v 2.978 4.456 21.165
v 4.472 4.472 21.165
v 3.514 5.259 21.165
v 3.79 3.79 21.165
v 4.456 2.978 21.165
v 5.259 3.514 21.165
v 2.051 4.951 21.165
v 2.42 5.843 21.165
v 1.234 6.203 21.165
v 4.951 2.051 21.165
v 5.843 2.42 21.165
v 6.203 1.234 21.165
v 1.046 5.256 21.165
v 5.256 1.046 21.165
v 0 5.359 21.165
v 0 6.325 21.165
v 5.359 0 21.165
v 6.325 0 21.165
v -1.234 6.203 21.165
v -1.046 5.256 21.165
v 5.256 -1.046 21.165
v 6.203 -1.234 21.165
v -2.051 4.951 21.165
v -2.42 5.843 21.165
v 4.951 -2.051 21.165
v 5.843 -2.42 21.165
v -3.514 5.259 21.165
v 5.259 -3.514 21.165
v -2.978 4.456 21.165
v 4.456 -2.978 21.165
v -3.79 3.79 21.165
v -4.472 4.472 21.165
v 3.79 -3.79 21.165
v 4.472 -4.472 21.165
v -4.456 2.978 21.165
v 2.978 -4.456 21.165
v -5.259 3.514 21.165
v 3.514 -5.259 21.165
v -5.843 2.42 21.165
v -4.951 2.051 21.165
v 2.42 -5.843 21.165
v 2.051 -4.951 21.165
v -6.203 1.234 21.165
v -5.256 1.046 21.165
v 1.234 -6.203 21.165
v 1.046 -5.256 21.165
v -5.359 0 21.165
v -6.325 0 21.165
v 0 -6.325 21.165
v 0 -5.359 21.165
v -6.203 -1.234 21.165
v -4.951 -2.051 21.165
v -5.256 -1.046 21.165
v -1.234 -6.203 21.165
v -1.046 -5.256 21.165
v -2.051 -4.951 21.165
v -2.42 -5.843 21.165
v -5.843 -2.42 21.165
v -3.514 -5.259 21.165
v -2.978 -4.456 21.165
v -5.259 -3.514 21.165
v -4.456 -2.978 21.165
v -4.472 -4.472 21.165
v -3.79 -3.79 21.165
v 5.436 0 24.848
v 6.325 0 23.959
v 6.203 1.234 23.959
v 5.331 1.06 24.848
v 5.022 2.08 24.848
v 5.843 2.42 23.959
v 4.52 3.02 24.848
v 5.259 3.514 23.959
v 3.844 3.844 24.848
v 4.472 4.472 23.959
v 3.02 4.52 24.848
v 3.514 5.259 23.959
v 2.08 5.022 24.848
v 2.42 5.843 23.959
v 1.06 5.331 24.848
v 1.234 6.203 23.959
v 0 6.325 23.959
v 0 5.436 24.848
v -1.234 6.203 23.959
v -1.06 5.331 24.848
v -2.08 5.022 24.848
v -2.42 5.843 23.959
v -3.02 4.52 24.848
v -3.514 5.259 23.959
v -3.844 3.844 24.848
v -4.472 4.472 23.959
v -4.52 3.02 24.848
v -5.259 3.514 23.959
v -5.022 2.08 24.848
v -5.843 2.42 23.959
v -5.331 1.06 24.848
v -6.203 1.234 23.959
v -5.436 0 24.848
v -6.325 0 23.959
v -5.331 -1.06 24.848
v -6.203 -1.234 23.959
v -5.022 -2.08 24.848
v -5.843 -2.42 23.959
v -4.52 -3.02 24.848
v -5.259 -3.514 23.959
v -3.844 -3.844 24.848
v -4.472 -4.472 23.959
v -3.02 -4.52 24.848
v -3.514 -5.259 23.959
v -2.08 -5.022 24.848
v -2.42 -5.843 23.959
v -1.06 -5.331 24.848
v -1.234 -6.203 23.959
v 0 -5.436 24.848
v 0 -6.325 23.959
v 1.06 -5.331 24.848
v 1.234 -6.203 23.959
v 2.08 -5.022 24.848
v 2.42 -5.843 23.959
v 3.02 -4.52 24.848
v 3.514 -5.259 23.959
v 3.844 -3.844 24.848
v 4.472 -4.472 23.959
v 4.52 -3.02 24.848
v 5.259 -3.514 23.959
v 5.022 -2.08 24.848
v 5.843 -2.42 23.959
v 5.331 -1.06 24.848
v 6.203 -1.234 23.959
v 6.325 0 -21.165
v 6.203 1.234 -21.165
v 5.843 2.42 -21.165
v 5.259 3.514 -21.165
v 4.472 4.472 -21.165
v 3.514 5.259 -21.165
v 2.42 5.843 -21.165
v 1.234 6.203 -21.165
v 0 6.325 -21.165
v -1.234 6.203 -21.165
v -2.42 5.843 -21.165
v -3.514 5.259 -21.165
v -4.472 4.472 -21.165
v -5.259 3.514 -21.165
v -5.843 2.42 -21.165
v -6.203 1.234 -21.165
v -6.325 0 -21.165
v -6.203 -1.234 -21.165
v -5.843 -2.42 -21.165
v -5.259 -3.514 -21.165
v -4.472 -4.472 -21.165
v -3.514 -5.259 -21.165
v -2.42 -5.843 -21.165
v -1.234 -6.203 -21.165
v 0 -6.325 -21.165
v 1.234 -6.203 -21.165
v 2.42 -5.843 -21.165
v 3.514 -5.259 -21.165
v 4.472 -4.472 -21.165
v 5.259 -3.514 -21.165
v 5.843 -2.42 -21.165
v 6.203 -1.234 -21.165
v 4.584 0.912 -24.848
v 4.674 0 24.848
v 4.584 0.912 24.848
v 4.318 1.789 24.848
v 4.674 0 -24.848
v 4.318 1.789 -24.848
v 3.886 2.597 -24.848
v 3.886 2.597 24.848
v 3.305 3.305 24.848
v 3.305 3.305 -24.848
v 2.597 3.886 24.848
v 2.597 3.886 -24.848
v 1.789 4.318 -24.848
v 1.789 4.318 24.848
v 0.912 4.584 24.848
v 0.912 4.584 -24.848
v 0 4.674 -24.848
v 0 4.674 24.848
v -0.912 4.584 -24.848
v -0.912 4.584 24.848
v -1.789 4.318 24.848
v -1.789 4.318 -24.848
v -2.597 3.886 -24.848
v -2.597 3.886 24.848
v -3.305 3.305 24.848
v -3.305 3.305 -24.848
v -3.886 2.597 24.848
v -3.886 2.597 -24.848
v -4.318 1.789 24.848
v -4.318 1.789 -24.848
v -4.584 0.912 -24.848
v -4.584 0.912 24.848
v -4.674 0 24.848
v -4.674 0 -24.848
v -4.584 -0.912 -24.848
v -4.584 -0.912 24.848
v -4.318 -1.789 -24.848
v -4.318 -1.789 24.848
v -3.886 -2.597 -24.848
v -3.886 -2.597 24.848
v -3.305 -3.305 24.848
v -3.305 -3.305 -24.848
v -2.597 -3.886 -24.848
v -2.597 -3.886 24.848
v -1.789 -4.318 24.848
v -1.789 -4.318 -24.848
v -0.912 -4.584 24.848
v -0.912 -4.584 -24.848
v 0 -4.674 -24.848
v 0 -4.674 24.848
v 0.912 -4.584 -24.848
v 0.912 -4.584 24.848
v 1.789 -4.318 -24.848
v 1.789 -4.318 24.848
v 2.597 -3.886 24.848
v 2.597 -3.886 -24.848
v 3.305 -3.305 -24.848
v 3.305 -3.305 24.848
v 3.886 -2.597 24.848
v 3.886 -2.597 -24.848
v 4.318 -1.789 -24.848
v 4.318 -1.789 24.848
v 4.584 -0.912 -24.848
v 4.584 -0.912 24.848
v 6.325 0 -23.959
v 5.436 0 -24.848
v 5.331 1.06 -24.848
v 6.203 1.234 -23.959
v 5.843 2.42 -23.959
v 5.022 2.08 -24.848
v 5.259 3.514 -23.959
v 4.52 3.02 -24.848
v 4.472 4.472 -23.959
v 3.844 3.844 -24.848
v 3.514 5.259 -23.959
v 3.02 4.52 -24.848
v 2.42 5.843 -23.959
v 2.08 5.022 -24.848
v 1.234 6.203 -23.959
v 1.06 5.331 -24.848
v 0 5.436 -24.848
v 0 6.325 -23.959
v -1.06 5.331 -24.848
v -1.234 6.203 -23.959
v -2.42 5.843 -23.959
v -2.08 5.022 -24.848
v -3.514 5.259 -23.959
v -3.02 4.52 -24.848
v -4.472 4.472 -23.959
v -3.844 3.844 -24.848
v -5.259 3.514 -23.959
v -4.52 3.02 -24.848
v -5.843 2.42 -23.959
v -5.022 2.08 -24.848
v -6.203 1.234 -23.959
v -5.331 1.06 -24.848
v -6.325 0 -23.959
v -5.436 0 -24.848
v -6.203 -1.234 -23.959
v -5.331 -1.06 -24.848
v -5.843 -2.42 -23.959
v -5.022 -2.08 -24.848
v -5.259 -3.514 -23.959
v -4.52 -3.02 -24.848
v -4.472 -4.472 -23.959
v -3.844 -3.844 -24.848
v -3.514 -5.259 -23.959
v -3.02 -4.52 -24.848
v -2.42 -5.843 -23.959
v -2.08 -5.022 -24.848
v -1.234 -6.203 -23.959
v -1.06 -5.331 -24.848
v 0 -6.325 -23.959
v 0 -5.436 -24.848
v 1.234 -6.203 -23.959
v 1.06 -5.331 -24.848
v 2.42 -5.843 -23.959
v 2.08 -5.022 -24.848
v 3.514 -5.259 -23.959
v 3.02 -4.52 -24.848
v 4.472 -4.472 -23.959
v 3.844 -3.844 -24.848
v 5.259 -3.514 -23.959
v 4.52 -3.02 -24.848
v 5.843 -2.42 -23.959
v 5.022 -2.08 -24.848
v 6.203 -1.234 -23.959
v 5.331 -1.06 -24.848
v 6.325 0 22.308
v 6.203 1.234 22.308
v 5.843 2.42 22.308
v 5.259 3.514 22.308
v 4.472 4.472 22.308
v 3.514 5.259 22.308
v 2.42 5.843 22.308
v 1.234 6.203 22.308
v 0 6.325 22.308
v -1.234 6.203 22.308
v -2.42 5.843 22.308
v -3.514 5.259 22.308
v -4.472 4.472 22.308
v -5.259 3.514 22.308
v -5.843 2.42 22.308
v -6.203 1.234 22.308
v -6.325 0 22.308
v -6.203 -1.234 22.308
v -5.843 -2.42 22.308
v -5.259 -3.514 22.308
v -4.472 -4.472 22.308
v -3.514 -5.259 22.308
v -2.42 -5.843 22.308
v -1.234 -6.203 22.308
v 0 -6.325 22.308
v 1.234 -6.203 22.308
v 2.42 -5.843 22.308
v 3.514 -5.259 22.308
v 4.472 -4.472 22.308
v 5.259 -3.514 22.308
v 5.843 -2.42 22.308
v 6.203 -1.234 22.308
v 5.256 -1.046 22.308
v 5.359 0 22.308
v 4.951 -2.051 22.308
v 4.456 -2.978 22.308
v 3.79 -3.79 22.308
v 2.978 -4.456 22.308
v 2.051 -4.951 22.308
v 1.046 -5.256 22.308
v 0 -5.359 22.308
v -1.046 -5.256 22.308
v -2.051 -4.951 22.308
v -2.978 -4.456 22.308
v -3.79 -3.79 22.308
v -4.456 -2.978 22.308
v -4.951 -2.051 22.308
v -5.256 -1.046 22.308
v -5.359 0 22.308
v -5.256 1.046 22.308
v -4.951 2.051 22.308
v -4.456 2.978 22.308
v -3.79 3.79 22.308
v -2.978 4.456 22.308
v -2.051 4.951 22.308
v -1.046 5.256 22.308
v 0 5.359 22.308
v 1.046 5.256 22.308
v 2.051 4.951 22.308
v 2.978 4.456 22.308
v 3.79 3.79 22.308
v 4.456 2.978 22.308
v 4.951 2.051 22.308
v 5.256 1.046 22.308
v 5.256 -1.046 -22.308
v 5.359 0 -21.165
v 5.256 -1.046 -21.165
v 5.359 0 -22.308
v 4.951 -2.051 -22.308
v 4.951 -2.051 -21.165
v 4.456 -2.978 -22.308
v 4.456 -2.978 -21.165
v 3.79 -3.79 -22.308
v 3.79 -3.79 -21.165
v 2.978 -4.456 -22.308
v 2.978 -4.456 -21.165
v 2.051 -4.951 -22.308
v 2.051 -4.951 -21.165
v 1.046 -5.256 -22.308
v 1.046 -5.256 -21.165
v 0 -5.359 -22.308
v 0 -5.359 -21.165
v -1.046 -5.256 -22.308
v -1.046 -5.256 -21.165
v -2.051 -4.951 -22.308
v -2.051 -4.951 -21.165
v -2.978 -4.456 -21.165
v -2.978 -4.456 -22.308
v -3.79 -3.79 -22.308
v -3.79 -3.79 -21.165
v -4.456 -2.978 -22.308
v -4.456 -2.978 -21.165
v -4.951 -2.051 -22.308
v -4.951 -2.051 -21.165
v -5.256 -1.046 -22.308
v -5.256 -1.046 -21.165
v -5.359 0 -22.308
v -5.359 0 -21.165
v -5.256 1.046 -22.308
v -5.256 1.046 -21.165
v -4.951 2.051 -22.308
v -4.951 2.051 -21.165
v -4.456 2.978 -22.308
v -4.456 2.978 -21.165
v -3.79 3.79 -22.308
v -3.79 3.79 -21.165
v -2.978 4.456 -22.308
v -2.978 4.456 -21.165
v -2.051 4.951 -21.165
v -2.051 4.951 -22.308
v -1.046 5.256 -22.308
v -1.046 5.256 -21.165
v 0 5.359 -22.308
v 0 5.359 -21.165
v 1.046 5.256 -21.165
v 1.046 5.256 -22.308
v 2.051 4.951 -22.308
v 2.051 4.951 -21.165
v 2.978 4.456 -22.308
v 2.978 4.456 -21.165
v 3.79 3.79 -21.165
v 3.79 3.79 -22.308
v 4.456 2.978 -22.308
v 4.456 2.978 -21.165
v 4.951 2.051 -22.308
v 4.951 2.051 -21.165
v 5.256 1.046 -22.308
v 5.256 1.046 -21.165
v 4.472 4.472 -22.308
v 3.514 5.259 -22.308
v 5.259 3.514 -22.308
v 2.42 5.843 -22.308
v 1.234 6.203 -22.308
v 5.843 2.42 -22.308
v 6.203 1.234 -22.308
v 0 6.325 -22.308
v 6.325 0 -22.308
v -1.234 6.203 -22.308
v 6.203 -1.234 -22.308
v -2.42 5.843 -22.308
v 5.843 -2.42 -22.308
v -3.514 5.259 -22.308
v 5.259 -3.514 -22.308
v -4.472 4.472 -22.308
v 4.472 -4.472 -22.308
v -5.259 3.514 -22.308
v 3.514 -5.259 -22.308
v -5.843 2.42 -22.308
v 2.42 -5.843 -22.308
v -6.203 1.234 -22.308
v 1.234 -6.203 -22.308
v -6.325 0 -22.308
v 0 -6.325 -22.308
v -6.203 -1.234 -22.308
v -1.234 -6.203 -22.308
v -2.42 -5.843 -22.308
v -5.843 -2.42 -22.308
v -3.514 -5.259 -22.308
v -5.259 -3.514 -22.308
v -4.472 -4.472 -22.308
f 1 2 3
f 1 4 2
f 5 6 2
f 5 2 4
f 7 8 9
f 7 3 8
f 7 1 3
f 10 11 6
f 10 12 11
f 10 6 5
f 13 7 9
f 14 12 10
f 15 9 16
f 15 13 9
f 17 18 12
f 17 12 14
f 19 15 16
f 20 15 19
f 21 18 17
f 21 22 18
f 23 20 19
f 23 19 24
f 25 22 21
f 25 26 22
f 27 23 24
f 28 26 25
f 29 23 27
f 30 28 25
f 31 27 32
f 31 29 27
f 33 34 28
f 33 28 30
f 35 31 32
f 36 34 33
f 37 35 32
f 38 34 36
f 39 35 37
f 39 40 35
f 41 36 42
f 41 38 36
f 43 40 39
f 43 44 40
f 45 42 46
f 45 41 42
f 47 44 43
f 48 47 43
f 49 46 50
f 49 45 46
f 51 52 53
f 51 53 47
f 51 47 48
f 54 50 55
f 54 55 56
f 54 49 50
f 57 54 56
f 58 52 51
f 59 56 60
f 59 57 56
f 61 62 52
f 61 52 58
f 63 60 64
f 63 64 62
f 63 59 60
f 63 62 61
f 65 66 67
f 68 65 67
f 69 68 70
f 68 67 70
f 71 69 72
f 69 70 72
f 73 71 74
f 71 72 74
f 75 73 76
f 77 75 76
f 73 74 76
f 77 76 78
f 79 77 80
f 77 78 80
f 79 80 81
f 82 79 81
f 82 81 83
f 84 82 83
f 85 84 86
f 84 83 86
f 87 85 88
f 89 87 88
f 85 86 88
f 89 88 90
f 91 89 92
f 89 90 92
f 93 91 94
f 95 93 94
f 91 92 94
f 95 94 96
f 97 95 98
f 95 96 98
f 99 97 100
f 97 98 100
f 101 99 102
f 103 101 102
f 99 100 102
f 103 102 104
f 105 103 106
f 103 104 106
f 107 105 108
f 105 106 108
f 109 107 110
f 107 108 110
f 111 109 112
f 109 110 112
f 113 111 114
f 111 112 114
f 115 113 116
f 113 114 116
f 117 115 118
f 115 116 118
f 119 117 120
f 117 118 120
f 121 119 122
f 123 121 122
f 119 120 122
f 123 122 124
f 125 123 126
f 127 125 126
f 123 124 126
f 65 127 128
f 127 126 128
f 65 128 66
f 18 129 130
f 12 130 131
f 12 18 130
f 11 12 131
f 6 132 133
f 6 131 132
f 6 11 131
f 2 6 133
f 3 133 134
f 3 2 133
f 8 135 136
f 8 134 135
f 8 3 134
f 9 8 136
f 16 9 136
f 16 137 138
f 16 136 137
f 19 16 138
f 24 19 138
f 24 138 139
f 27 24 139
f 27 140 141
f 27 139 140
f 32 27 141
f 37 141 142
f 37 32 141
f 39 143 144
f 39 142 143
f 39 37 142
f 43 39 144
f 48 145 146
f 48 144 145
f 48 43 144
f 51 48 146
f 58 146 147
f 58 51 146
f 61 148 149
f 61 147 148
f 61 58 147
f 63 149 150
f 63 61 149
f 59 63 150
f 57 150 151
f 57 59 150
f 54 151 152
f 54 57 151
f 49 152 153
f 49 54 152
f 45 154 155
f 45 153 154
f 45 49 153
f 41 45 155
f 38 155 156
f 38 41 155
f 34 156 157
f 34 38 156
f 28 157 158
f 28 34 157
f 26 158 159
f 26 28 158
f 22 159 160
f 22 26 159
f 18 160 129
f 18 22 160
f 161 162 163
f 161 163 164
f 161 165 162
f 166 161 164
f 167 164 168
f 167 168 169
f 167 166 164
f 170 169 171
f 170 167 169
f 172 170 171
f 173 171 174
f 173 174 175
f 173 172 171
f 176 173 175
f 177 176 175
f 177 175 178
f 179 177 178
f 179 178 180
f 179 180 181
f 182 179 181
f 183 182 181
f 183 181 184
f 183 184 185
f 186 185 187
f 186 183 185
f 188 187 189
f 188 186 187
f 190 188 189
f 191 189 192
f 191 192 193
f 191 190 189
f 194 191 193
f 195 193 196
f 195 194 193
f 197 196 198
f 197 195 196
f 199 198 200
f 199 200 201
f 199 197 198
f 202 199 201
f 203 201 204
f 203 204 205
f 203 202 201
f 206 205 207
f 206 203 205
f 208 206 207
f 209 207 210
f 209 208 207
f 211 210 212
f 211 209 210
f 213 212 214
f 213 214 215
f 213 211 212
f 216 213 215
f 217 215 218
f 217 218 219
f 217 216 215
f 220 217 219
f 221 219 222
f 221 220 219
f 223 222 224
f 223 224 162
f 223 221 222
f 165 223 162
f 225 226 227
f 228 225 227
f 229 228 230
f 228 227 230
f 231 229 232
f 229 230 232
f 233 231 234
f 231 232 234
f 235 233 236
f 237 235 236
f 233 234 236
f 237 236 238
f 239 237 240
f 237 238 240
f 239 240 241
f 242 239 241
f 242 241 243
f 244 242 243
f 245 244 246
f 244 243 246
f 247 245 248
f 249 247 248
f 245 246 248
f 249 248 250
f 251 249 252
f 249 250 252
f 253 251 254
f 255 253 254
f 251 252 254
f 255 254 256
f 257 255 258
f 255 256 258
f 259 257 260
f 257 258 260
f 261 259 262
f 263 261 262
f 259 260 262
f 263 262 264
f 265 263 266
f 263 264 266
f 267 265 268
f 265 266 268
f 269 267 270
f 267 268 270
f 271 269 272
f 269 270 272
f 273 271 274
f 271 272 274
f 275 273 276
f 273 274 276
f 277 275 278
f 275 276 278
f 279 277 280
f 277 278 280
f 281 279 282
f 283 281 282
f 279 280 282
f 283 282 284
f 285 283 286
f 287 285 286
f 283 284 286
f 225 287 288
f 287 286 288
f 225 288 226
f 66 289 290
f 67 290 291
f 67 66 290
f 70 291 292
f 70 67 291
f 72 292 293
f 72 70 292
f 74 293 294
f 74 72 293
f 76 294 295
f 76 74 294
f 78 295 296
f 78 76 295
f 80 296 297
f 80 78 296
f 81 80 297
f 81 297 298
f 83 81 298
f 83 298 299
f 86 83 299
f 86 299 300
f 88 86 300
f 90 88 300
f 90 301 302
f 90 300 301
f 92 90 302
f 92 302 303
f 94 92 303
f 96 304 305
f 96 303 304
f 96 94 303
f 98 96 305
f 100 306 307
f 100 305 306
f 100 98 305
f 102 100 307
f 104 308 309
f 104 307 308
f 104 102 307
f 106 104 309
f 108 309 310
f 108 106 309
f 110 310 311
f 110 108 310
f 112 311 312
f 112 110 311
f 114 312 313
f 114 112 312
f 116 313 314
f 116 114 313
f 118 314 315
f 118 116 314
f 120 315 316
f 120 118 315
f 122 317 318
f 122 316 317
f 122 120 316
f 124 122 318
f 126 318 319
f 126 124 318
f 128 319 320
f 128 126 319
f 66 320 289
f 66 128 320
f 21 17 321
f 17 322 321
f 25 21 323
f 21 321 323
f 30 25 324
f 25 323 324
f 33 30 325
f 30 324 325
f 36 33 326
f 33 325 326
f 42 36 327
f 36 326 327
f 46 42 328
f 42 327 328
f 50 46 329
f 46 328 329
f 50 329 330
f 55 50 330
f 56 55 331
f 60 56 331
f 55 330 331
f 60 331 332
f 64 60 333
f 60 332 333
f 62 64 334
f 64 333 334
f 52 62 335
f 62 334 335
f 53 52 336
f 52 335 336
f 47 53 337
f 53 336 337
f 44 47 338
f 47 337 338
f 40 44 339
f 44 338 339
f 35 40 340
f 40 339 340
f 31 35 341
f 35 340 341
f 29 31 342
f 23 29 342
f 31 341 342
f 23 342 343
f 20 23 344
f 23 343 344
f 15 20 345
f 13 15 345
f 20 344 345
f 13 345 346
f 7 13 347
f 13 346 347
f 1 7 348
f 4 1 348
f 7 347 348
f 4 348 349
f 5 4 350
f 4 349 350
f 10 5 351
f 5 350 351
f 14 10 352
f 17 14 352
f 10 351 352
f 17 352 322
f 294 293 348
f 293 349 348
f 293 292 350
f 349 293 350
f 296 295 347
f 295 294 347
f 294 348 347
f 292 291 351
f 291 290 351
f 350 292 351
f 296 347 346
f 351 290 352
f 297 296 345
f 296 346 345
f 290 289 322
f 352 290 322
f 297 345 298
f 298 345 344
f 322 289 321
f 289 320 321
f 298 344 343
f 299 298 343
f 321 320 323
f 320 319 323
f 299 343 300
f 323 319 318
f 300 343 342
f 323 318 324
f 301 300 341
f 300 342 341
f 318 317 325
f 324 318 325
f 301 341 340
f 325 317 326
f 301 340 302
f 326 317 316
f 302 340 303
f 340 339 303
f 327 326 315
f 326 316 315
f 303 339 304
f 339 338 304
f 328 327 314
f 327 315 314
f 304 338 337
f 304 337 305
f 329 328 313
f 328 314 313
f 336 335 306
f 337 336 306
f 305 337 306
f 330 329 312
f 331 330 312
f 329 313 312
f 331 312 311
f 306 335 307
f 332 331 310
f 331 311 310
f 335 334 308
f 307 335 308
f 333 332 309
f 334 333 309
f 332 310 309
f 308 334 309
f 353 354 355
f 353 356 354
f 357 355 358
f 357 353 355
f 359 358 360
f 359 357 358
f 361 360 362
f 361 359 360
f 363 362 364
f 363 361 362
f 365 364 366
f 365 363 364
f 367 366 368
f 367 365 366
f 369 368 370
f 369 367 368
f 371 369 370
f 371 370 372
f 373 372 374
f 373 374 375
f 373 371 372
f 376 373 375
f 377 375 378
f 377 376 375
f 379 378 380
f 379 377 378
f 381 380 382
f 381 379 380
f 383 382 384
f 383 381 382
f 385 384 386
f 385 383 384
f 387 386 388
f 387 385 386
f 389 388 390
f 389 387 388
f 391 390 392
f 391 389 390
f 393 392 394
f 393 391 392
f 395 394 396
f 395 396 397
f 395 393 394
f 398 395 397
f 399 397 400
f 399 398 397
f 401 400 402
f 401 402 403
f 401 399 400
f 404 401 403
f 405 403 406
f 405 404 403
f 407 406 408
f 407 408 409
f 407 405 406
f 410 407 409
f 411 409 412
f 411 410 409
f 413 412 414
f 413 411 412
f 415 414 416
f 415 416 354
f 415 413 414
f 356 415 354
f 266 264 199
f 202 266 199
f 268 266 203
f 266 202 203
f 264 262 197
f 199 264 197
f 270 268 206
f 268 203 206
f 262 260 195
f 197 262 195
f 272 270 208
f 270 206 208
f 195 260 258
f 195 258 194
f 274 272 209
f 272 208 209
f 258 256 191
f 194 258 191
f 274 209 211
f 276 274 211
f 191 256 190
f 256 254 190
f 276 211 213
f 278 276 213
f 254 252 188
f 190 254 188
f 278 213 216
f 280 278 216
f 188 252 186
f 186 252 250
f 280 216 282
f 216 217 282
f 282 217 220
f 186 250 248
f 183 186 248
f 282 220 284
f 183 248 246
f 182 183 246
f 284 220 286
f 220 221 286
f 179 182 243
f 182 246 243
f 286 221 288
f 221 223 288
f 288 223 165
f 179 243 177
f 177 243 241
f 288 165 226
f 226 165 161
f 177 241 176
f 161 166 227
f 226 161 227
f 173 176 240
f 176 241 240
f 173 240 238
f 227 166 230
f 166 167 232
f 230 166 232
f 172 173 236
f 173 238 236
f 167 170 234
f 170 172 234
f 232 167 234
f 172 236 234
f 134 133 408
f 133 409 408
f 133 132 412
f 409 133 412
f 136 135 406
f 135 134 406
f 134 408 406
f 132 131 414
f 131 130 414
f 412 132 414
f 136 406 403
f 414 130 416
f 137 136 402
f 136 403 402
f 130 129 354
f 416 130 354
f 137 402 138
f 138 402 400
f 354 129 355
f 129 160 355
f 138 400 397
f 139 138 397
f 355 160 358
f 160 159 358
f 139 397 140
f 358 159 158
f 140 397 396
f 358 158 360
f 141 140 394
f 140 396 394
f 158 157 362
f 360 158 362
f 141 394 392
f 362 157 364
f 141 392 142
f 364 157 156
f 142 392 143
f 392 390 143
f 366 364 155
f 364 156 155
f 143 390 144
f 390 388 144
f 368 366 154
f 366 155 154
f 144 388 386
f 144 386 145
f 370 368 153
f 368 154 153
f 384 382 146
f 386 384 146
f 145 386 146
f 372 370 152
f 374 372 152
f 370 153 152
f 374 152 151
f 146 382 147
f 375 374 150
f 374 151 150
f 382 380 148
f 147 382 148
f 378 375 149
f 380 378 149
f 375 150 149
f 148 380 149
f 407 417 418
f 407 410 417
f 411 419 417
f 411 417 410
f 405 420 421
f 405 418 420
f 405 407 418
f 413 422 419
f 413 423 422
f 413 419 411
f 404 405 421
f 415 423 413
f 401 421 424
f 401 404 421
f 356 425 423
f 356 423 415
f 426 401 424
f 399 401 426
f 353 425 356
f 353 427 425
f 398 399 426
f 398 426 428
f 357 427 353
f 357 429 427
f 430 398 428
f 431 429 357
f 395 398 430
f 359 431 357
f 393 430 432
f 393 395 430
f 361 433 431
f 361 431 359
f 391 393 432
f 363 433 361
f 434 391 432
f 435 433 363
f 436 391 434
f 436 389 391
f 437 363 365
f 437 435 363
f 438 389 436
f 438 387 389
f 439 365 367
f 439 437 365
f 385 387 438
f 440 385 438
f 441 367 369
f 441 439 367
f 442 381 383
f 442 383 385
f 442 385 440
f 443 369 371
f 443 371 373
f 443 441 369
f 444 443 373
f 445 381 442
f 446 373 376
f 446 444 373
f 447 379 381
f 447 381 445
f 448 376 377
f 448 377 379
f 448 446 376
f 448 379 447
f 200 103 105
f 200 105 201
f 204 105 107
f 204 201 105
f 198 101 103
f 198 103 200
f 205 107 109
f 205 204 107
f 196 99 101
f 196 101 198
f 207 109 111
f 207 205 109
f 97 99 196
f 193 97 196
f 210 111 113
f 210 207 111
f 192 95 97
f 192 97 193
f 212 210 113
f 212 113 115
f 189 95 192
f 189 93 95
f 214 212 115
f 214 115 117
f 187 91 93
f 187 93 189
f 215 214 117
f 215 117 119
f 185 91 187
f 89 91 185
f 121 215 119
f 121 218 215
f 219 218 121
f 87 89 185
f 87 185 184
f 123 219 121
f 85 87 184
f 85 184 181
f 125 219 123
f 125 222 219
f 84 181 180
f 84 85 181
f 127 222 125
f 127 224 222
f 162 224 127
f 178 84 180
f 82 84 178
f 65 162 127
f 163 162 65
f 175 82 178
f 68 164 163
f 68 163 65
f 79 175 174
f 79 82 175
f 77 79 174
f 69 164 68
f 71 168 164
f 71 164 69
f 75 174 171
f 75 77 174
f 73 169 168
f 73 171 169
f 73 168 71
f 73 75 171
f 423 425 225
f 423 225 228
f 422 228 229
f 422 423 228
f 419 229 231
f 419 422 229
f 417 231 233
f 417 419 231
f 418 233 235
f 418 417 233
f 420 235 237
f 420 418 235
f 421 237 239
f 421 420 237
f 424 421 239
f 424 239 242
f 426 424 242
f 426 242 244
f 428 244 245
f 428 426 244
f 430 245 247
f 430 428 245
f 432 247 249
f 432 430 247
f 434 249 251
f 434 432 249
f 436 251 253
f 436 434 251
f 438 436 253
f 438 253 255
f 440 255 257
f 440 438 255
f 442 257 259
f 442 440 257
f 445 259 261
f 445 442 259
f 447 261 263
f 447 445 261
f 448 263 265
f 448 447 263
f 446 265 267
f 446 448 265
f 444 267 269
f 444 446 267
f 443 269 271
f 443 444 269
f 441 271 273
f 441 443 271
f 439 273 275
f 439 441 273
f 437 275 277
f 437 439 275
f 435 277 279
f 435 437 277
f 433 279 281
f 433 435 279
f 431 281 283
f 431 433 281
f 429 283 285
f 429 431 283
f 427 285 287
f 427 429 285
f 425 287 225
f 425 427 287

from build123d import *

# Parameters (mm, degrees)
SKETCH1_R           = 6.3246
SKETCH1_R_2         = 4.6736
BOSS_EXTRUDE1_DEPTH = 24.84755
SKETCH2_W           = 0.9652
SKETCH2_H           = 1.143
CHAMFER1_SIZE       = 0.889


with BuildPart() as part:
    # Sketch1 → Boss-Extrude1 (new body, symmetric)
    with BuildSketch(Plane.XY):
        Circle(SKETCH1_R)
        Circle(SKETCH1_R_2, mode=Mode.SUBTRACT)
    extrude(amount=BOSS_EXTRUDE1_DEPTH, both=True)

    # Sketch2 → Cut-Revolve1 (revolve, cut)
    with BuildSketch(Plane(origin=(0, 0, 0), x_dir=(1, 0, 0), z_dir=(0, 1, 0))):
        with Locations((5.842, 21.73605)):
            Rectangle(SKETCH2_W, SKETCH2_H)
    cut_revolve1 = revolve(axis=Axis((0, 0, 1000), (0, 0, -1)), mode=Mode.SUBTRACT)

    # Mirror1: Cut-Revolve1 across plane
    add(cut_revolve1.mirror(Plane.XY), mode=Mode.SUBTRACT)

    # Chamfer1
    chamfer1_edges = [part.edges().sort_by_distance(p)[0] for p in [
        (-6.3246, 0, -24.84755),
        (-6.3246, 0, 24.84755),
    ]]
    chamfer(chamfer1_edges, length=CHAMFER1_SIZE)


solid = part.part
